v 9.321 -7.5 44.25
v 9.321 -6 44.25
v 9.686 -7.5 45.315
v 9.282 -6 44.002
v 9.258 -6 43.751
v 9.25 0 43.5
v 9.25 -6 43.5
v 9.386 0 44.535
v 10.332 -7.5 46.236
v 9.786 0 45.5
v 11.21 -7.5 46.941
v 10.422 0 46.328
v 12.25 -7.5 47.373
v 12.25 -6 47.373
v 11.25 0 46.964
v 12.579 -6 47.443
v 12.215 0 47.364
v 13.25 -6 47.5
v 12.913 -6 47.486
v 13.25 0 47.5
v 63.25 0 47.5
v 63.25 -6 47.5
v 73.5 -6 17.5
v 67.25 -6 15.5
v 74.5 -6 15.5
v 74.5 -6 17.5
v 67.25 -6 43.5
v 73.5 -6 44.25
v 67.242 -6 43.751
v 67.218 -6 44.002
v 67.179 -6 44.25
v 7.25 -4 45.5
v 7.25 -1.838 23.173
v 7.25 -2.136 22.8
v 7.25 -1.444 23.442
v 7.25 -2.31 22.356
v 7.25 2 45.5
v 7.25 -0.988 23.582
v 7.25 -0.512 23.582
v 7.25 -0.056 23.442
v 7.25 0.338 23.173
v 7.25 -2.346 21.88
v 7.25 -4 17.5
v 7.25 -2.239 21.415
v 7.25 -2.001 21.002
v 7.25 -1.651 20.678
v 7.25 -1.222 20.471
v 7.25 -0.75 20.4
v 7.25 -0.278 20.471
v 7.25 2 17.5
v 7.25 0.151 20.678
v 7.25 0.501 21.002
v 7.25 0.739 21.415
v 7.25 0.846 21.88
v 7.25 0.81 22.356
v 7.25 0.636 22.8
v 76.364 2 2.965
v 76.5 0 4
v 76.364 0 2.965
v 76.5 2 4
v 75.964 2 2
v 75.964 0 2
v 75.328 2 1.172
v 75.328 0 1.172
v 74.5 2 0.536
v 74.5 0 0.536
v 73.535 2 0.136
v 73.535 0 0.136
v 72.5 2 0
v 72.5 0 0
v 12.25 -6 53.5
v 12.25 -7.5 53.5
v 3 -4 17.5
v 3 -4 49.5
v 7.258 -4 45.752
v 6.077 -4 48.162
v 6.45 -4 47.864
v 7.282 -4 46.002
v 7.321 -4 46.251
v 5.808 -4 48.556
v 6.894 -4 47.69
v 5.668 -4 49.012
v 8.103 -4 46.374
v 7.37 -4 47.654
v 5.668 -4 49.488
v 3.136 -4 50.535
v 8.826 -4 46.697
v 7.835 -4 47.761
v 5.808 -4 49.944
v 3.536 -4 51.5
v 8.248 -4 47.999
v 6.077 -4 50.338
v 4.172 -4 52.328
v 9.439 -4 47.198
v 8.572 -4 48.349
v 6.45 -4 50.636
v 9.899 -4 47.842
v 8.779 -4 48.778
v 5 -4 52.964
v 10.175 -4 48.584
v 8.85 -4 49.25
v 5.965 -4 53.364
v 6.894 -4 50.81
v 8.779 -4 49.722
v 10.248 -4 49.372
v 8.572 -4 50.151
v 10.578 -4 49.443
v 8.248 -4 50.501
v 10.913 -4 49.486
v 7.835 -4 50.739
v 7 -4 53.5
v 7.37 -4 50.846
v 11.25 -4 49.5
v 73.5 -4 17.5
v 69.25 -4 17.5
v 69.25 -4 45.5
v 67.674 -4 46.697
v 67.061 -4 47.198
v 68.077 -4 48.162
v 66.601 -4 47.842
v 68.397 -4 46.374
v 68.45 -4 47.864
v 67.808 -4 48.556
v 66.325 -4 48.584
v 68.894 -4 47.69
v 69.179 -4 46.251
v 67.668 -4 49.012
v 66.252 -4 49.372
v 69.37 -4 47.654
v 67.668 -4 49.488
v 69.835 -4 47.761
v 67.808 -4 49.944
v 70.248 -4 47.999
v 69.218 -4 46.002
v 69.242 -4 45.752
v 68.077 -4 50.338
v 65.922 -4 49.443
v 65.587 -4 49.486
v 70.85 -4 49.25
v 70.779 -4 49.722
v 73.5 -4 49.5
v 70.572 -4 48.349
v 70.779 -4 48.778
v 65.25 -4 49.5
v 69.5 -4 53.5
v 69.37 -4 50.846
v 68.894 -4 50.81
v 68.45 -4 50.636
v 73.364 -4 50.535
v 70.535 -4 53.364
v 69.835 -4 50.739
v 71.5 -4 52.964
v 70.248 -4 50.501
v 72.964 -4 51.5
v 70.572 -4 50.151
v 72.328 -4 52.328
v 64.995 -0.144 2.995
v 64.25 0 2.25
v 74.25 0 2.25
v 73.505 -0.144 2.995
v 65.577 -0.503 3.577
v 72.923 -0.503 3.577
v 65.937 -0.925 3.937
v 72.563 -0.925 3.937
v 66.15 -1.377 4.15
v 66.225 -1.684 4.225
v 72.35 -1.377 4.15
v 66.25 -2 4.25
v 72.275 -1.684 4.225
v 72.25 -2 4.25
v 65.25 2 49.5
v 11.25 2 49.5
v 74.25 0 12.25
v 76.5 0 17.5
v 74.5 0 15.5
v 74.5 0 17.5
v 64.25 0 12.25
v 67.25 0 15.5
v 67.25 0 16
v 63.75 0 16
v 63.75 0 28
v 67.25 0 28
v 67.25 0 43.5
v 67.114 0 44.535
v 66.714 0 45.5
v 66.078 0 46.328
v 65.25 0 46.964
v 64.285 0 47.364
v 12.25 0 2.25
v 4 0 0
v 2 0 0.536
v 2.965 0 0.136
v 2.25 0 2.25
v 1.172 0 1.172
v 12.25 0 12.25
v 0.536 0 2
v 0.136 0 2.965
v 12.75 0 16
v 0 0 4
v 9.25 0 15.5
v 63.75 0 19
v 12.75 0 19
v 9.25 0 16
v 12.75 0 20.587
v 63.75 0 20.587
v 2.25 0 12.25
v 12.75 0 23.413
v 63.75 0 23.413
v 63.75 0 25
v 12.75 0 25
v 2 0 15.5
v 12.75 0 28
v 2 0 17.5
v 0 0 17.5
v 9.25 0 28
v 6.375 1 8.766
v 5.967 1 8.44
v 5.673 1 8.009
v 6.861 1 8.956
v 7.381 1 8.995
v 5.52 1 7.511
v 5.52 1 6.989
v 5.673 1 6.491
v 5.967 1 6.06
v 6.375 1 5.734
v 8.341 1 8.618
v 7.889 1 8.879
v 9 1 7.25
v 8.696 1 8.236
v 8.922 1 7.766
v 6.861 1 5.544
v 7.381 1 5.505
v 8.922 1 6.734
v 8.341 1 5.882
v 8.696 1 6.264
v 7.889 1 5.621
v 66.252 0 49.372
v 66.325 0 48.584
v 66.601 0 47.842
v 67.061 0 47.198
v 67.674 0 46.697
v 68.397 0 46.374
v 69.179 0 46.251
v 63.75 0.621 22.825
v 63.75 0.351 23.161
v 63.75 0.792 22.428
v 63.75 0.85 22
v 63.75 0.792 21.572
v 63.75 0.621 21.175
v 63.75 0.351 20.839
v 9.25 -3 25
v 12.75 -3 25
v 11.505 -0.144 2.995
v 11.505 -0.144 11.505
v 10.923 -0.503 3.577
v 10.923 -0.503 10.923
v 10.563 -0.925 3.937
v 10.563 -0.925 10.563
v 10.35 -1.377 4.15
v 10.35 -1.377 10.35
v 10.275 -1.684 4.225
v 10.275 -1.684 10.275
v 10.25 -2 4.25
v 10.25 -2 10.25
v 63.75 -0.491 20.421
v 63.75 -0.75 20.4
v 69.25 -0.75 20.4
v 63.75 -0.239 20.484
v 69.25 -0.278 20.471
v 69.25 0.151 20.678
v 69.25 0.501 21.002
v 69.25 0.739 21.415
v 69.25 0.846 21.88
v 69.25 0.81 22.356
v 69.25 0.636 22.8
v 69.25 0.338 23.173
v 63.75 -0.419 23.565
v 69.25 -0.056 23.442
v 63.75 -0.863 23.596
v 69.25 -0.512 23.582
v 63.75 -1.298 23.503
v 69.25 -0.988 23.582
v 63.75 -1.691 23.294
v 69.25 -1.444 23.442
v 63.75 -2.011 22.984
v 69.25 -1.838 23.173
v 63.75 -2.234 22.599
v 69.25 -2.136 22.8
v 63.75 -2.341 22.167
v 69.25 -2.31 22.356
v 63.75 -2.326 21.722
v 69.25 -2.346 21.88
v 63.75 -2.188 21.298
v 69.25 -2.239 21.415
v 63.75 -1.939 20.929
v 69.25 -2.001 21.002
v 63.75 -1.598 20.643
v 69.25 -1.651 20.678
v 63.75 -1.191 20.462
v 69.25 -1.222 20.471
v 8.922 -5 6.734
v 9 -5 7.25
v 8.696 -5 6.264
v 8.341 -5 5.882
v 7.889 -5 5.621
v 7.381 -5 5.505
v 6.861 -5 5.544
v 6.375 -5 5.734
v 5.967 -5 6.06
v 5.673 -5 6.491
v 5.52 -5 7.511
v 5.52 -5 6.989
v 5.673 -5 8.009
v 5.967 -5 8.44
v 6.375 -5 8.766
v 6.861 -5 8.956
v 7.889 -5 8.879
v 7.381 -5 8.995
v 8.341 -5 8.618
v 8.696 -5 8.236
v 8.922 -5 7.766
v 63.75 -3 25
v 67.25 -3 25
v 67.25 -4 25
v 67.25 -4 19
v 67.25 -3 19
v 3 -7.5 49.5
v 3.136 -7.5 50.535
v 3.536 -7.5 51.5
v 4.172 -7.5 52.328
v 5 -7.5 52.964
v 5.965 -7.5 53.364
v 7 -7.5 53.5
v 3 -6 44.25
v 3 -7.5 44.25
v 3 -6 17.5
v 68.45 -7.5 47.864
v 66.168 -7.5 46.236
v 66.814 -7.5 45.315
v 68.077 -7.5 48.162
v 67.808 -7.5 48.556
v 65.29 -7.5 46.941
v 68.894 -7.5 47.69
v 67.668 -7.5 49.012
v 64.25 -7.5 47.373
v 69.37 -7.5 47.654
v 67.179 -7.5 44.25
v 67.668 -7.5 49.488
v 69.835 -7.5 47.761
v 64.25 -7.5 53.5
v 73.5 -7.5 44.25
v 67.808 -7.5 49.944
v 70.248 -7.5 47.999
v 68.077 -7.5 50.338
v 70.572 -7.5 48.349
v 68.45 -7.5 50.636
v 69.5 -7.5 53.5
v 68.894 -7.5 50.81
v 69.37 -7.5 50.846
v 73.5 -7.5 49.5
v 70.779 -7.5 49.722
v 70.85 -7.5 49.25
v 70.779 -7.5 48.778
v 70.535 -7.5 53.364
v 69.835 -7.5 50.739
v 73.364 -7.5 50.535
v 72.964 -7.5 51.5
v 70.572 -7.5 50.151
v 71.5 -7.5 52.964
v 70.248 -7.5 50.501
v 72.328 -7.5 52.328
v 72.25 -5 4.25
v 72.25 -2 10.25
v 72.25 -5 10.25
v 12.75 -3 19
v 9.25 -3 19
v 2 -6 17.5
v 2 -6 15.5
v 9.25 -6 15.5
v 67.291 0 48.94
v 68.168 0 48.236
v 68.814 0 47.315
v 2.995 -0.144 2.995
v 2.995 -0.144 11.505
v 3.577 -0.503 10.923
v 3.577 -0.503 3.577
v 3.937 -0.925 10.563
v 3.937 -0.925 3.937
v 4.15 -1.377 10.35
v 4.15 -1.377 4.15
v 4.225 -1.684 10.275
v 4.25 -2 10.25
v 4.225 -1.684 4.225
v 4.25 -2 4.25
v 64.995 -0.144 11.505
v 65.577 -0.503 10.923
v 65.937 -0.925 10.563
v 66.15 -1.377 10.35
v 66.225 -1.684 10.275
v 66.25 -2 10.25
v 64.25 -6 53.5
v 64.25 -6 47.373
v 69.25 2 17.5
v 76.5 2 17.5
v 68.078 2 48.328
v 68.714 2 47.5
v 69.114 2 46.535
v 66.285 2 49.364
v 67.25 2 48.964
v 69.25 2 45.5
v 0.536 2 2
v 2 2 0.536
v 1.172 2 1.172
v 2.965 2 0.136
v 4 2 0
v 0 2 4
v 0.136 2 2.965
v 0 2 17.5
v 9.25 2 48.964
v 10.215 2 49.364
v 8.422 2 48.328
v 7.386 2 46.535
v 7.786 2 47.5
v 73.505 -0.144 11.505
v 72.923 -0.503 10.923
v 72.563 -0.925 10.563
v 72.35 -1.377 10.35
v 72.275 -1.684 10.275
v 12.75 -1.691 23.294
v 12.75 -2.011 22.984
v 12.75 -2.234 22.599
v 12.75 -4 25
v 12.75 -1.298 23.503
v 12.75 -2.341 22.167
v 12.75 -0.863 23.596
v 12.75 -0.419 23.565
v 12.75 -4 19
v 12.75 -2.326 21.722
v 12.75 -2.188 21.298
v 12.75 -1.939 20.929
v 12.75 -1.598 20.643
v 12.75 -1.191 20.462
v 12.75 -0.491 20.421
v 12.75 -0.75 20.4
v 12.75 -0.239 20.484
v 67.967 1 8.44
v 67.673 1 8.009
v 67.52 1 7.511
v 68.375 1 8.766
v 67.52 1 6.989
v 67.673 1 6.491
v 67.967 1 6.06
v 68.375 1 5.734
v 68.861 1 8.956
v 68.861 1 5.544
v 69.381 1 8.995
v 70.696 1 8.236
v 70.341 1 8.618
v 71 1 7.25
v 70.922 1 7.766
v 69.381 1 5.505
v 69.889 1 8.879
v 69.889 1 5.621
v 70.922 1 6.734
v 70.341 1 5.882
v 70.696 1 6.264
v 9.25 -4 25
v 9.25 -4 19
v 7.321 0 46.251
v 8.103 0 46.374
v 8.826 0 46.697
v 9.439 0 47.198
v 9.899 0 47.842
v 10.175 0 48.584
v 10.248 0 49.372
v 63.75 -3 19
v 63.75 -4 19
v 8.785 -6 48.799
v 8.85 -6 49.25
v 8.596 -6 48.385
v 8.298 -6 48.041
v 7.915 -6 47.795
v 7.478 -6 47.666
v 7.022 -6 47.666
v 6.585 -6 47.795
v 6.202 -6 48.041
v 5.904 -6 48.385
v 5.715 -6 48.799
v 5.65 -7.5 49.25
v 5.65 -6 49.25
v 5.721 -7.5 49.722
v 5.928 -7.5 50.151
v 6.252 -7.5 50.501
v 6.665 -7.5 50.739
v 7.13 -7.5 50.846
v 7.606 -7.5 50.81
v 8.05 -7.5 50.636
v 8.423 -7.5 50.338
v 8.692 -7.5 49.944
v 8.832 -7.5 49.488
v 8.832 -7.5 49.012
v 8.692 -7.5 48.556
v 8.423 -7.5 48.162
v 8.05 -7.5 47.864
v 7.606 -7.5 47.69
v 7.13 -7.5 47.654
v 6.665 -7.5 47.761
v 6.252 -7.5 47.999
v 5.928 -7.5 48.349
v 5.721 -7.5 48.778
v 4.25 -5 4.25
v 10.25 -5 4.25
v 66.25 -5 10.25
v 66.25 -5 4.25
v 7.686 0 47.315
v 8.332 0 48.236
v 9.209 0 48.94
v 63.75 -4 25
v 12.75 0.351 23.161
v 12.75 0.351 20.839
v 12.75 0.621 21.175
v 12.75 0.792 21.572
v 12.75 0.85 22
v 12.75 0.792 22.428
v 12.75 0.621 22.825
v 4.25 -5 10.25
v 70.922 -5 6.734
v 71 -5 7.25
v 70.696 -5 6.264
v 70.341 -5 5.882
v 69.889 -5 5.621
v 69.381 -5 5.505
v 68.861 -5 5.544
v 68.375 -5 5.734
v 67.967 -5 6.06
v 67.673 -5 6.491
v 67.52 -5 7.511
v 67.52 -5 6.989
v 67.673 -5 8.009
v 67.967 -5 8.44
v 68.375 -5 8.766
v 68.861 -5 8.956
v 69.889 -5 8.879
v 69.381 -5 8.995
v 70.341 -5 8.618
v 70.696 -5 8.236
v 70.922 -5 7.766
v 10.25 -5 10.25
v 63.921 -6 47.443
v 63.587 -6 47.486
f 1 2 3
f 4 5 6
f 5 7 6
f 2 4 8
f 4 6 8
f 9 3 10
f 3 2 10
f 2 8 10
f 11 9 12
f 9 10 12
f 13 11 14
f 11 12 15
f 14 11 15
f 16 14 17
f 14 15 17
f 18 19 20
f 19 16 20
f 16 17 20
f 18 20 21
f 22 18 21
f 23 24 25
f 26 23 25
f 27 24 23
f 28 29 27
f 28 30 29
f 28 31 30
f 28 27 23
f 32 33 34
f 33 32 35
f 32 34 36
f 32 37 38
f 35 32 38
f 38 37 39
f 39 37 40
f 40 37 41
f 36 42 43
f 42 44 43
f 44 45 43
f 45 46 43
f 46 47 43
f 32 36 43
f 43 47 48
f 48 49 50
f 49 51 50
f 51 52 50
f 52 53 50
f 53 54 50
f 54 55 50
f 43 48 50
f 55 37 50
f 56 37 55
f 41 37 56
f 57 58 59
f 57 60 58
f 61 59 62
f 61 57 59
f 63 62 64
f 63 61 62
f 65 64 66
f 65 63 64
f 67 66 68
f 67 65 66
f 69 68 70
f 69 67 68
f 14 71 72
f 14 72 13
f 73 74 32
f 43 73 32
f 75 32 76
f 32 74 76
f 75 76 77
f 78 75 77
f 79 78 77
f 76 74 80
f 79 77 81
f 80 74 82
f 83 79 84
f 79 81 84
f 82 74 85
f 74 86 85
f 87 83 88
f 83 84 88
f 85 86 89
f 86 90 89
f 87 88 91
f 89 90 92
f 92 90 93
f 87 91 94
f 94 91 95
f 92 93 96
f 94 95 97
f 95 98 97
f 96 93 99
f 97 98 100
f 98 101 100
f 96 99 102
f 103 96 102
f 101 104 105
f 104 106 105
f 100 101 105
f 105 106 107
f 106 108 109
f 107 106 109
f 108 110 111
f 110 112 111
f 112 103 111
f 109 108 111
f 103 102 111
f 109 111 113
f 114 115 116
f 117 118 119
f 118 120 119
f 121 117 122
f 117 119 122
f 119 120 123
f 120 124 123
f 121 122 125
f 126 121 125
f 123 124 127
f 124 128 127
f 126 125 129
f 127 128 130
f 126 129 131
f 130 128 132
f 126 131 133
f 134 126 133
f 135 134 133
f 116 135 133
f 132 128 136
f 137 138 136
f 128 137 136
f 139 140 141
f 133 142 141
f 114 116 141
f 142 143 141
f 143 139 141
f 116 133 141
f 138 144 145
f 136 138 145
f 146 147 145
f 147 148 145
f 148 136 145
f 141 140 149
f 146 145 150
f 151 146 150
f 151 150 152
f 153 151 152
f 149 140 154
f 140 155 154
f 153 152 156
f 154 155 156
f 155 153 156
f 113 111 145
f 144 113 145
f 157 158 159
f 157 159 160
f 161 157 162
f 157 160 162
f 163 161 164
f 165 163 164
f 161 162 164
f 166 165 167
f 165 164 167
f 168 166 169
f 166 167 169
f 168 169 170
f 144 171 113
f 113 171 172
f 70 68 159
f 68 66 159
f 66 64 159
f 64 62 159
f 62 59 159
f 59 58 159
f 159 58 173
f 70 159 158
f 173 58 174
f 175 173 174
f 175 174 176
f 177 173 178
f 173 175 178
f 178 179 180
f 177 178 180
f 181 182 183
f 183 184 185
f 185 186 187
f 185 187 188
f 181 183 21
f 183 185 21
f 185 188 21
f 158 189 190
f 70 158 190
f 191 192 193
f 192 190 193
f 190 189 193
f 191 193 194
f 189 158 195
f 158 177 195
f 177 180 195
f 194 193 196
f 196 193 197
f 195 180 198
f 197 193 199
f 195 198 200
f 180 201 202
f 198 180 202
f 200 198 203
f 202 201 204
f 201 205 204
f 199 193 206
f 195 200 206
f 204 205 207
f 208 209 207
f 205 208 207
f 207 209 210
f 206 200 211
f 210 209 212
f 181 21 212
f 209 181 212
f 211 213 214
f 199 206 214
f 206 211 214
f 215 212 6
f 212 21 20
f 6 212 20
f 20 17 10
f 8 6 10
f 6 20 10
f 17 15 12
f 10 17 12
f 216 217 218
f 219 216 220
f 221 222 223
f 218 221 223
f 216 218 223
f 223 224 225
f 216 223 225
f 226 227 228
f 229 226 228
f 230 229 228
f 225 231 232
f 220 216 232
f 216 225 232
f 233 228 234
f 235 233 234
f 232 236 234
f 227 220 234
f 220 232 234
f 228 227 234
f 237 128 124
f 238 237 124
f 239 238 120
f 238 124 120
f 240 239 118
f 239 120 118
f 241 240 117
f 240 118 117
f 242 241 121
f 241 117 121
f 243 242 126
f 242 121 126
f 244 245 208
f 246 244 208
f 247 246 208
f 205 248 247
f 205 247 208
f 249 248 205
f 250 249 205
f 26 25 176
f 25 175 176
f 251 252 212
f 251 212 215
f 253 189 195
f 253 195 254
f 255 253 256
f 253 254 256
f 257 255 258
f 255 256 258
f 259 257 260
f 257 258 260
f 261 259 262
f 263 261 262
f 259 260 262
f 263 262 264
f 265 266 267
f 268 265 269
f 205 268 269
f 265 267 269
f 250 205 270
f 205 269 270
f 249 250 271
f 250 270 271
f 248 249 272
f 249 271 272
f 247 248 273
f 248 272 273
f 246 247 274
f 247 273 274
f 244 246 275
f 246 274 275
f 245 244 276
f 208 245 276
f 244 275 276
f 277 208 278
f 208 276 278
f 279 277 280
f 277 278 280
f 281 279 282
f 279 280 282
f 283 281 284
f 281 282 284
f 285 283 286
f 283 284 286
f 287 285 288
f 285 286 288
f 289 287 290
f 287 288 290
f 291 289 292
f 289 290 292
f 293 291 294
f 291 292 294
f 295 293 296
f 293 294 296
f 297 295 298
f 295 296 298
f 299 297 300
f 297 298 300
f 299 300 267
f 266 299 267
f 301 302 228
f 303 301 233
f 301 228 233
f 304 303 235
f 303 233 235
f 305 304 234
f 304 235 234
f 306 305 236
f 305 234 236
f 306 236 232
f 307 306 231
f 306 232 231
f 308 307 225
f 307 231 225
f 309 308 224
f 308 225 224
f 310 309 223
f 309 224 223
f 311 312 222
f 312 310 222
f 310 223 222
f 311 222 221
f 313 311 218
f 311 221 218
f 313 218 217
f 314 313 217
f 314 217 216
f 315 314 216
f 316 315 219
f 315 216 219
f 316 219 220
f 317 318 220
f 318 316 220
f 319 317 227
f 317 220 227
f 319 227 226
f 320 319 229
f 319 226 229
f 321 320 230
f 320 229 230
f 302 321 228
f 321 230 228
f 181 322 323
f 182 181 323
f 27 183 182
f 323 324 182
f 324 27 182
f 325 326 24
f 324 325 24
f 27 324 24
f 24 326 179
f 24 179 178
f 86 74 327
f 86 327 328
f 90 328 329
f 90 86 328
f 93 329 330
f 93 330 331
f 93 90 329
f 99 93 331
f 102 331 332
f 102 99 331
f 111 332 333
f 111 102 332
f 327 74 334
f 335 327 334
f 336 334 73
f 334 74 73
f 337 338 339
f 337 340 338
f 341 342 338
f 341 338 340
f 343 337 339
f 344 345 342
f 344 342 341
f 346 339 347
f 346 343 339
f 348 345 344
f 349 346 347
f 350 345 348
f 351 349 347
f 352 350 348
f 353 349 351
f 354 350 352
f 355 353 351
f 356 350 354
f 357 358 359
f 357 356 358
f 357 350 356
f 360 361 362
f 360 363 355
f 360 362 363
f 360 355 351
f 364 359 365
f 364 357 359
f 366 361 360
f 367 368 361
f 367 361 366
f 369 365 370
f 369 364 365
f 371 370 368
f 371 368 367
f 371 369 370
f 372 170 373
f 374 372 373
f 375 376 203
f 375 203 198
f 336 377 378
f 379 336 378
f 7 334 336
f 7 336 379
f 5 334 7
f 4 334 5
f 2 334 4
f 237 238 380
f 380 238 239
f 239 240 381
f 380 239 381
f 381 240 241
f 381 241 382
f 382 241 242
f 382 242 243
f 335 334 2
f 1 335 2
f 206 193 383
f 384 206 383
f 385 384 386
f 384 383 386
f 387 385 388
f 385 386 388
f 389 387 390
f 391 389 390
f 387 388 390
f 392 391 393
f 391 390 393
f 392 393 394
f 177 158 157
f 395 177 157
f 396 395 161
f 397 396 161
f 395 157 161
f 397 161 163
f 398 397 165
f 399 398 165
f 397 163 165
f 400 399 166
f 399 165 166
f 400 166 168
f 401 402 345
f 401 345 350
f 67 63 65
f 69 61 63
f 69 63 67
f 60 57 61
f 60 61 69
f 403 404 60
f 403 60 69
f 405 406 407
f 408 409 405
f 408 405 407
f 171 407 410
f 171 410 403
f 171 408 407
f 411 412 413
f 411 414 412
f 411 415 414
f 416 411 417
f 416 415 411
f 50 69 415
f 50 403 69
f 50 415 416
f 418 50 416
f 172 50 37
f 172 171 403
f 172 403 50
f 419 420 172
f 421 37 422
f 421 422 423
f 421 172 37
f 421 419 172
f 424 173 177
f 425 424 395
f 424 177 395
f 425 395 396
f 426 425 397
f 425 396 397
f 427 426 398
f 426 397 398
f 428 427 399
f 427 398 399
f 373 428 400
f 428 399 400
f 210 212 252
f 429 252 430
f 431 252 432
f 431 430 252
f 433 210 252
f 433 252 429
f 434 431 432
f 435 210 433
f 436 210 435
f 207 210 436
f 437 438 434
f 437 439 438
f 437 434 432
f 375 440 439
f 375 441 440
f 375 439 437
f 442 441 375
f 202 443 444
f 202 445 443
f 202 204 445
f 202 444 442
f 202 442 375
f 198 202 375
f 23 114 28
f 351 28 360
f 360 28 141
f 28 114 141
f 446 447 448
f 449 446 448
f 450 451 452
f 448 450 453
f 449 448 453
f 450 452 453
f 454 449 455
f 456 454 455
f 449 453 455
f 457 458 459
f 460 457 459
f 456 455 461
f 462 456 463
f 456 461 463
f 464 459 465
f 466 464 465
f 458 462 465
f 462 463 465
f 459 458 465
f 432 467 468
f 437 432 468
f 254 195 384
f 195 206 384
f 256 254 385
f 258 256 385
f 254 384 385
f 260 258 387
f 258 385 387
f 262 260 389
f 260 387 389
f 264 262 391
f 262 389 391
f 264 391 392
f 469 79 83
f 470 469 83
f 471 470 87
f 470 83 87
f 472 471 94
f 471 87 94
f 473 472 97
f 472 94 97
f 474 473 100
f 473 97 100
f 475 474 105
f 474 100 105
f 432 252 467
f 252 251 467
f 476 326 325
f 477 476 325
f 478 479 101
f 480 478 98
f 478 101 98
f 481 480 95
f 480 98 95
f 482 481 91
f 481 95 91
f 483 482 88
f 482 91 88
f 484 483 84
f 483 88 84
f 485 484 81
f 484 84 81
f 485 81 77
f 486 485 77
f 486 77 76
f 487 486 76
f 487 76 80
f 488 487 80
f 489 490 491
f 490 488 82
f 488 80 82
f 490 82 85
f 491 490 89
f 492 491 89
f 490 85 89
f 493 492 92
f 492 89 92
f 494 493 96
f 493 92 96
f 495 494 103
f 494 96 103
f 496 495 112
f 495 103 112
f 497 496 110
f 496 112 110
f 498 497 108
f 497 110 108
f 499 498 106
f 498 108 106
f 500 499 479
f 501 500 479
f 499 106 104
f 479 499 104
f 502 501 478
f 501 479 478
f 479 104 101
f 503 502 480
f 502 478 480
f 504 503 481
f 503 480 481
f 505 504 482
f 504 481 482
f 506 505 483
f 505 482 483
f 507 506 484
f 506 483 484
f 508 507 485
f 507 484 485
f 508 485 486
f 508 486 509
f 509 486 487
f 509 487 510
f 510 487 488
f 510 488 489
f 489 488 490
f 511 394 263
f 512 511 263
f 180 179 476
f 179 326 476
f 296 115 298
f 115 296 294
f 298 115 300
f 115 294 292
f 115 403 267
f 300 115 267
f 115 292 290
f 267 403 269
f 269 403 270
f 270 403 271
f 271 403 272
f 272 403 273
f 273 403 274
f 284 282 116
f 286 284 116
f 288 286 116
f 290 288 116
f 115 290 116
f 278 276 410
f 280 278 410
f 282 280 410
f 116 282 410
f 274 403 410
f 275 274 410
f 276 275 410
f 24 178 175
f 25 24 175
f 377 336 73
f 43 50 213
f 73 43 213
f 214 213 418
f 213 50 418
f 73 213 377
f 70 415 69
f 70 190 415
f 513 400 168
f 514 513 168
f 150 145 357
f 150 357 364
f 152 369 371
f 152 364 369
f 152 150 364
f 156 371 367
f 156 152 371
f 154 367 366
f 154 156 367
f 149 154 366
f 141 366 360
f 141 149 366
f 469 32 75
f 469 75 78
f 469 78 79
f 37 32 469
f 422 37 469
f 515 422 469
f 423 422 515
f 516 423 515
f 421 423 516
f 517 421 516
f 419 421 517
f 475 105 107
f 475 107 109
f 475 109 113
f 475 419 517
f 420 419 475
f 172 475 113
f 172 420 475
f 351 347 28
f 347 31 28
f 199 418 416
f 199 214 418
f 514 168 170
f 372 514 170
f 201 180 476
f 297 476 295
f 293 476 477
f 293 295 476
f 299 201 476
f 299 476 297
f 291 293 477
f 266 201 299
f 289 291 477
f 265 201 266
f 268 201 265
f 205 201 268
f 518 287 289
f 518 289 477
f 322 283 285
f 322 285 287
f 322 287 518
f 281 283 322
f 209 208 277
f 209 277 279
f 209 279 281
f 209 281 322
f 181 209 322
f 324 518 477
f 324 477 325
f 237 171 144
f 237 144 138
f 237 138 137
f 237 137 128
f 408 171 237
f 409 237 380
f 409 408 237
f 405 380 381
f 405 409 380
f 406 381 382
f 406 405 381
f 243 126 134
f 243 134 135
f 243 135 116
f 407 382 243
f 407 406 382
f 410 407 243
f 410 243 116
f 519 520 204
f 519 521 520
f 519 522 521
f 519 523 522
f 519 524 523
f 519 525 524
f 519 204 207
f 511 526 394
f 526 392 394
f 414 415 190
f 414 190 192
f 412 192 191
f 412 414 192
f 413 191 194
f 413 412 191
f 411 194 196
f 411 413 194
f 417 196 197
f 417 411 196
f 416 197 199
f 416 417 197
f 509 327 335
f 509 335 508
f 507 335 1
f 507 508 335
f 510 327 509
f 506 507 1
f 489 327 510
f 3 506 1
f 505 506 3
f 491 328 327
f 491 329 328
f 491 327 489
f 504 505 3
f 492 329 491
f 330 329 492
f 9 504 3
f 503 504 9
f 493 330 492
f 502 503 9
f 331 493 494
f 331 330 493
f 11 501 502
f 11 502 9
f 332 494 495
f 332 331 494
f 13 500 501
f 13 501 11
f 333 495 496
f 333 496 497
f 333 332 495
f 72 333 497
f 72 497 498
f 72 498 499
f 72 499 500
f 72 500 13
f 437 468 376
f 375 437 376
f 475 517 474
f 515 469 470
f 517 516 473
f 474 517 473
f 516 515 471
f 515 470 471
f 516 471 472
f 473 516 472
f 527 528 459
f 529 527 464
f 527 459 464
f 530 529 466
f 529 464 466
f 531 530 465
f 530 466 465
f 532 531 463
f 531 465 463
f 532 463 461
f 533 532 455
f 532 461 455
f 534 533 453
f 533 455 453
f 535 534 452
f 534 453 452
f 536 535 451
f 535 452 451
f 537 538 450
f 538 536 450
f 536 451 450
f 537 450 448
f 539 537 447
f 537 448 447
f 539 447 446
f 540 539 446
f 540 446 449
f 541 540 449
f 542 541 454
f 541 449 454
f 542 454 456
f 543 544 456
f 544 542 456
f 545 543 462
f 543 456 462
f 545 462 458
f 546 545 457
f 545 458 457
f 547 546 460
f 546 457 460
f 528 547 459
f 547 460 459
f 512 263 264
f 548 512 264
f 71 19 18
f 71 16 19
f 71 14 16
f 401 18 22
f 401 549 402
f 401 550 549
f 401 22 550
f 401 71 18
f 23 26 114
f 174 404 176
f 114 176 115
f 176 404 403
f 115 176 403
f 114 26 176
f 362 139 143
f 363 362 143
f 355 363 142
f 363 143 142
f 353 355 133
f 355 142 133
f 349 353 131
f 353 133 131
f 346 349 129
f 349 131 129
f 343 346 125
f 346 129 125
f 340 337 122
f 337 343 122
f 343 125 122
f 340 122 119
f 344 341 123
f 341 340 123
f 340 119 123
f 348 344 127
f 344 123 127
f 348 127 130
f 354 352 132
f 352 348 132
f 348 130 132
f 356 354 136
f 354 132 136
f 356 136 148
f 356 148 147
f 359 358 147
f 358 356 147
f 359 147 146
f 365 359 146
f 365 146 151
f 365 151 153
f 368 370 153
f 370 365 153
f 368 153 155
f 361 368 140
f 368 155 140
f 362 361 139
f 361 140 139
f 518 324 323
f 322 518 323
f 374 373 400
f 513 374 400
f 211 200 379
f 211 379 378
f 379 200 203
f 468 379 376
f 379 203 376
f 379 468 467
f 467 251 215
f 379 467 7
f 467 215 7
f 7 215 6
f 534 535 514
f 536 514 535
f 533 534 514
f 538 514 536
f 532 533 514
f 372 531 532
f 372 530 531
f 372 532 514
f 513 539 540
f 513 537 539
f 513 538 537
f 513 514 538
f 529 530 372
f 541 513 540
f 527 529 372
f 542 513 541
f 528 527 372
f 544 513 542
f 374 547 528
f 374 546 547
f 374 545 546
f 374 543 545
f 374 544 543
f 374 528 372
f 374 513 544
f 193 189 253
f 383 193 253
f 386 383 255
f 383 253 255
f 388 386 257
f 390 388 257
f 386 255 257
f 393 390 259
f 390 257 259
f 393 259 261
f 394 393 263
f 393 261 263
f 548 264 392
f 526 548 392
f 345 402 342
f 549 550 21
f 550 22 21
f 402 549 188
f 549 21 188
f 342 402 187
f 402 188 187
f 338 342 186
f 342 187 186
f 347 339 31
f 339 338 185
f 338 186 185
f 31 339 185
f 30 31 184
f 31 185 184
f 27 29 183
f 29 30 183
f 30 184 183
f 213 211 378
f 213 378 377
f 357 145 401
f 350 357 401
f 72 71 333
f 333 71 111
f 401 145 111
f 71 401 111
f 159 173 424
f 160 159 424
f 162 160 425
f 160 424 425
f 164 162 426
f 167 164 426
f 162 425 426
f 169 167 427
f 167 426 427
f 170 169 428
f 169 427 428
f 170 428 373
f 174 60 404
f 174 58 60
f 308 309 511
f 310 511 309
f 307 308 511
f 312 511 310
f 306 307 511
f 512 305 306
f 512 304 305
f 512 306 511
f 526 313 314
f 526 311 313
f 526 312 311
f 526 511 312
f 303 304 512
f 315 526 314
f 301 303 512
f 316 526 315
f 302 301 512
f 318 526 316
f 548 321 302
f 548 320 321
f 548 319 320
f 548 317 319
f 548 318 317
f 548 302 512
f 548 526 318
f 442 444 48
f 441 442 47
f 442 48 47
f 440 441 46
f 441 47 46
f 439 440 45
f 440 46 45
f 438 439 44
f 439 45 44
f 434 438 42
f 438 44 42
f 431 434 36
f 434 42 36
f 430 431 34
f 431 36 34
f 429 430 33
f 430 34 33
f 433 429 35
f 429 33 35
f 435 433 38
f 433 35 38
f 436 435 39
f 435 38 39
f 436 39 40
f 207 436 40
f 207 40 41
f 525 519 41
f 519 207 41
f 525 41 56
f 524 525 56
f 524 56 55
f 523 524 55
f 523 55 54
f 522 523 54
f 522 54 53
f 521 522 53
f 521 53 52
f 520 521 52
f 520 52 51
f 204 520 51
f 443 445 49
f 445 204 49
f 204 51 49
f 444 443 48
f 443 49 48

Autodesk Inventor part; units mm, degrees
ref_plane "YZ Plane" through (0, 0, 0) normal (1, 0, 0) x (0, 1, 0)
ref_plane "XZ Plane" through (0, 0, 0) normal (0, 1, 0) x (-1, 0, 0)
ref_plane "XY Plane" through (0, 0, 0) normal (0, 0, 1) x (1, 0, 0)
sketch "Sketch1" plane through (0, 0, 0) normal (0, 1, 0) x (-1, 0, 0)
  line L0 (0, 0) -> (-76.5, 0)
  line L1 (-76.5, 0) -> (-76.5, 56.5)
  line L2 (-76.5, 56.5) -> (0, 56.5)
  line L3 (0, 56.5) -> (0, 0)
  dimension "d0" = 76.5
  dimension "d1" = 56.5
extrude "Extrusion1" add sketch "Sketch1" along normal blind 2
ref_plane "Work Plane1" through (0, 0, 28.25) normal (0, 0, 1) x (1, 0, 0)
ref_plane "Work Plane2" through (38.25, 0, 0) normal (-1, 0, 0) x (0, 0, 1)
sketch "Sketch2" plane through (0, 2, 0) normal (0, 1, 0) x (1, 0, 0)
  line L0 (38.25, -67.8) -> (38.25, 11.3) construction
  line L1 (91.8, -28.25) -> (-15.3, -28.25) construction
  line L2 (7.25, -7.25) -> (69.25, -7.25) construction
  line L3 (69.25, -7.25) -> (69.25, -49.25) construction
  line L4 (69.25, -49.25) -> (7.25, -49.25) construction
  line L5 (7.25, -49.25) -> (7.25, -7.25) construction
  circle A0 centre (7.25, -7.25) radius 1.75
  circle A1 centre (69.25, -7.25) radius 1.75
  point P0 (0, 0)
  dimension "d4" = 62
  dimension "d5" = 42
  dimension "d6" = 3.5
  dimension "d7" = 3.5
sketch "Sketch3" plane through (0, 2, 0) normal (0, 1, 0) x (1, 0, 0)
  line L0 (76.5, 0) -> (0, 0) projected
  line L1 (0, 0) -> (0, -56.5) projected
  line L2 (0, -56.5) -> (76.5, -56.5) projected
  line L3 (76.5, -56.5) -> (76.5, 0) projected
  line L4 (0, -56.5) -> (0, 0) projected
  line L5 (0, -17.5) -> (7.25, -17.5)
  line L6 (7.25, -17.5) -> (7.25, -49.5)
  line L7 (7.25, -49.5) -> (69.25, -49.5)
  line L8 (69.25, -49.5) -> (69.25, -17.5)
  line L9 (69.25, -17.5) -> (76.5, -17.5)
  line L10 (38.25, -67.8) -> (38.25, 11.3) construction
  dimension "d12" = 62
  dimension "d13" = 7
  dimension "d14" = 39
extrude "Extrusion3" cut sketch "Sketch3" against normal up to surface (2 mm away) contours L3 L2 L1 L5 L6 L7 L8 L9
extrude "Extrusion4" cut sketch "Sketch2" against normal up to surface (2 mm away)
sketch "Sketch4" plane through (0, 0, 0) normal (0, -1, 0) x (1, 0, 0)
  line L0 (7.25, 17.5) -> (0, 17.5) projected
  line L1 (7.25, 49.5) -> (7.25, 17.5) projected
  line L2 (69.25, 49.5) -> (7.25, 49.5) projected
  line L3 (69.25, 17.5) -> (69.25, 49.5) projected
  line L4 (76.5, 17.5) -> (69.25, 17.5) projected
  line L5 (0, 17.5) -> (0, 0) projected
  line L6 (76.5, 0) -> (76.5, 17.5) projected
  line L7 (9.25, 15.5) -> (9.25, 47.5)
  line L8 (9.25, 47.5) -> (67.25, 47.5)
  line L9 (67.25, 47.5) -> (67.25, 15.5)
  line L10 (67.25, 15.5) -> (74.5, 15.5)
  line L11 (74.5, 15.5) -> (74.5, 17.5)
  line L12 (69.25, 17.5) -> (76.5, 17.5) projected
  line L13 (9.25, 15.5) -> (2, 15.5)
  line L14 (2, 15.5) -> (2, 17.5)
  dimension "d20" = 2
  dimension "d21" = 2
  dimension "d22" = 2
  dimension "d25" = 2
  dimension "d26" = 2
  dimension "d27" = 2
extrude "Extrusion5" add sketch "Sketch4" along normal blind 4
sketch "Sketch5" plane through (69.25, 2, 49.5) normal (1, 0, 0) x (0, 0, -1)
  line L0 (32, 0) -> (32, -6) construction
  line L1 (0, 0) -> (32, 0) construction
  line L2 (0, 0) -> (0, -6) construction
  line L3 (32, -6) -> (0, -6) construction
  circle A0 centre (27.5, -2.75) radius 1.6
  point P0 (49.5, -2)
  dimension "d28" = 3.2
  dimension "d29" = 2.75
  dimension "d30" = 4.5
extrude "Extrusion6" cut sketch "Sketch5" against normal up to surface (2 mm away)
sketch "Sketch6" plane through (67.25, -4, 15.5) normal (-1, 0, 0) x (0, 0, 1)
  arc A0 (5.0867, 4) -> (7.9133, 4) centre (6.5, 3.25) ccw projected
  line L0 (0, 4) -> (5.0867, 4) projected
  line L1 (7.9133, 4) -> (32, 4) projected
  line L2 (9.5, 4) -> (3.5, 4)
  line L3 (3.5, 4) -> (3.5, 0)
  line L4 (3.5, 0) -> (9.5, 0)
  line L5 (9.5, 0) -> (9.5, 4)
  line L6 (6.5, 3.25) -> (6.5, 4) construction
  point P0 (-15.5, 4)
  dimension "d33" = 6
  dimension "d34" = 4
extrude "Extrusion7" add sketch "Sketch6" along normal blind 3.5
sketch "Sketch7" plane through (67.25, -0.75, 22) normal (1, 0, 0) x (0, 0, -1)
  circle A0 centre (0, 0) radius 1.6 projected
  point P0 (22, 0.75)
extrude "Extrusion8" cut sketch "Sketch7" against normal up to surface (3.5 mm away)
sketch "Sketch8" plane through (0, -4, 0) normal (0, -1, 0) x (1, 0, 0)
  line L0 (7.25, 17.5) -> (2, 17.5) projected
  line L1 (2, 17.5) -> (2, 15.5) projected
  line L2 (2, 15.5) -> (9.25, 15.5) projected
  line L3 (9.25, 15.5) -> (9.25, 47.5) projected
  line L4 (9.25, 47.5) -> (67.25, 47.5) projected
  line L5 (67.25, 47.5) -> (67.25, 25) projected
  line L6 (67.25, 15.5) -> (74.5, 15.5) projected
  line L7 (74.5, 15.5) -> (74.5, 17.5) projected
  line L8 (74.5, 17.5) -> (69.25, 17.5) projected
  line L9 (69.25, 17.5) -> (69.25, 49.5) projected
  line L10 (69.25, 49.5) -> (7.25, 49.5) projected
  line L11 (7.25, 49.5) -> (7.25, 17.5) projected
  line L12 (73.5, 17.5) -> (73.5, 53.5)
  line L13 (73.5, 53.5) -> (3, 53.5)
  line L14 (3, 53.5) -> (3, 17.5)
  line L15 (74.5, 17.5) -> (69.25, 17.5) projected
  line L16 (7.25, 17.5) -> (2, 17.5) projected
  line L17 (67.25, 25) -> (63.75, 25) construction
  line L18 (63.75, 19) -> (63.75, 25) construction
  line L19 (67.25, 19) -> (63.75, 19) construction
  line L20 (67.25, 19) -> (67.25, 15.5) projected
  line L21 (67.25, 25) -> (67.25, 19)
  point P0 (0, 0)
  dimension "d39" = 53.5
  dimension "d65" = 1
  dimension "d66" = 1
extrude "Extrusion9" add sketch "Sketch8" along normal blind 2
fillet "Fillet1" radius 4 4 edges at (0, 1, 0) (76.5, 1, 0) (3, -5, 53.5) (73.5, -5, 53.5)
fillet "Fillet2" radius 4 4 edges at (7.25, -1, 49.5) (69.25, -1, 49.5) (9.25, -3, 47.5) (67.25, -3, 47.5)
sketch "Sketch9" plane through (0, 0, 0) normal (0, -1, 0) x (1, 0, 0)
  circle A0 centre (69.25, 7.25) radius 1.75 projected
  circle A1 centre (7.25, 7.25) radius 1.75 projected
  line L0 (72.25, 10.25) -> (66.25, 10.25)
  line L1 (66.25, 10.25) -> (66.25, 4.25)
  line L2 (66.25, 4.25) -> (72.25, 4.25)
  line L3 (72.25, 4.25) -> (72.25, 10.25)
  line L4 (72.25, 10.25) -> (66.25, 4.25) construction
  line L5 (66.25, 10.25) -> (72.25, 4.25) construction
  line L6 (10.25, 10.25) -> (4.25, 10.25)
  line L7 (4.25, 10.25) -> (4.25, 4.25)
  line L8 (4.25, 4.25) -> (10.25, 4.25)
  line L9 (10.25, 4.25) -> (10.25, 10.25)
  line L10 (10.25, 10.25) -> (4.25, 4.25) construction
  line L11 (4.25, 10.25) -> (10.25, 4.25) construction
  point P0 (0, 0)
  dimension "d44" = 6
  dimension "d45" = 6
  dimension "d46" = 6
  dimension "d47" = 6
extrude "Extrusion10" add sketch "Sketch9" along normal blind 5
sketch "Sketch10" plane through (0, 2, 0) normal (0, 1, 0) x (1, 0, 0)
  circle A0 centre (69.25, -7.25) radius 1.75 projected
  circle A1 centre (7.25, -7.25) radius 1.75 projected
  point P0 (0, 0)
extrude "Extrusion11" add sketch "Sketch10" against normal blind 1
sketch "Sketch11" plane through (0, -4, 0) normal (0, 1, 0) x (1, 0, 0)
  circle A0 centre (7.25, -7.25) radius 1.75 construction
  circle A1 centre (69.25, -7.25) radius 1.75 construction
  circle A2 centre (69.25, -7.25) radius 1.75 construction
  line L0 (7.25, -7.25) -> (69.25, -7.25) construction
  line L1 (69.25, -7.25) -> (69.25, -49.25) construction
  line L2 (69.25, -49.25) -> (7.25, -49.25) construction
  line L3 (7.25, -49.25) -> (7.25, -7.25) construction
  circle A3 centre (7.25, -49.25) radius 1.6
  circle A4 centre (69.25, -49.25) radius 1.6
  point P0 (0, 0)
  dimension "d52" = 3.2
  dimension "d53" = 3.2
  dimension "d54" = 42
extrude "Extrusion12" cut sketch "Sketch11" against normal up to surface (2 mm away)
sketch "Sketch14" plane through (0, -6, 0) normal (0, -1, 0) x (1, 0, 0)
  arc A0 (73.5, 49.5) -> (69.5, 53.5) centre (69.5, 49.5) ccw projected
  line L0 (73.5, 17.5) -> (73.5, 49.5) projected
  line L1 (69.5, 53.5) -> (7, 53.5) projected
  arc A1 (67.25, 43.5) -> (63.25, 47.5) centre (63.25, 43.5) ccw projected
  line L2 (67.25, 43.5) -> (67.25, 15.5) projected
  line L3 (13.25, 47.5) -> (63.25, 47.5) projected
  circle A2 centre (69.25, 49.25) radius 1.6 projected
  line L4 (67.1791, 44.25) -> (73.5, 44.25)
  line L5 (63.25, 47.5) -> (13.25, 47.5) projected
  line L6 (64.25, 47.373) -> (64.25, 53.5)
  line L7 (69.5, 53.5) -> (7, 53.5) projected
  point P0 (0, 0)
  dimension "d67" = 5
  dimension "d68" = 5
extrude "Extrusion15" add sketch "Sketch14" along normal blind 1.5
sketch "Sketch15" plane through (0, -4, 0) normal (0, 1, 0) x (1, 0, 0)
  arc A0 (67.7939, -48.5868) -> (68.4944, -47.8397) centre (69.25, -49.25) ccw projected
  circle A1 centre (69.25, -49.25) radius 3
  point P0 (0, 0)
  dimension "d71" = 6
extrude "Extrusion16" cut sketch "Sketch15" along normal blind 4
mirror "Mirror2" about plane through (38.25, 0, 0) normal (-1, 0, 0) of "Extrusion16", "Extrusion15"
fillet "Fillet3" radius 2 8 edges at (7.25, 0, 10.25) (4.25, 0, 7.25) (7.25, 0, 4.25) (10.25, 0, 7.25) (69.25, 0, 4.25) (66.25, 0, 7.25) (72.25, 0, 7.25) (69.25, 0, 10.25)
mirror "Mirror4" about plane through (38.25, 0, 0) normal (-1, 0, 0) of "Extrusion6", "Extrusion7", "Extrusion8"
chamfer "Chamfer1" distance 3 angle 45 4 edges at (11, 0, 19) (11, 0, 25) (65.5, 0, 25) (65.5, 0, 19)
sketch "Sketch16" plane through (0, -4, 0) normal (0, 1, 0) x (1, 0, 0)
  circle A0 centre (7.25, -49.25) radius 1.6 projected
  circle A1 centre (69.25, -49.25) radius 1.6 projected
  point P0 (0, 0)
extrude "Extrusion17" [suppressed]
equation "\"d7\" = d6"
equation "\"d21\" = d20"
equation "\"d22\" = d21"
equation "\"d26\" = d25"
equation "\"d45\" = d44"
equation "\"d46\" = d45"
equation "\"d47\" = d45"
equation "\"d68\" = d67"
properties part number "case_back"
